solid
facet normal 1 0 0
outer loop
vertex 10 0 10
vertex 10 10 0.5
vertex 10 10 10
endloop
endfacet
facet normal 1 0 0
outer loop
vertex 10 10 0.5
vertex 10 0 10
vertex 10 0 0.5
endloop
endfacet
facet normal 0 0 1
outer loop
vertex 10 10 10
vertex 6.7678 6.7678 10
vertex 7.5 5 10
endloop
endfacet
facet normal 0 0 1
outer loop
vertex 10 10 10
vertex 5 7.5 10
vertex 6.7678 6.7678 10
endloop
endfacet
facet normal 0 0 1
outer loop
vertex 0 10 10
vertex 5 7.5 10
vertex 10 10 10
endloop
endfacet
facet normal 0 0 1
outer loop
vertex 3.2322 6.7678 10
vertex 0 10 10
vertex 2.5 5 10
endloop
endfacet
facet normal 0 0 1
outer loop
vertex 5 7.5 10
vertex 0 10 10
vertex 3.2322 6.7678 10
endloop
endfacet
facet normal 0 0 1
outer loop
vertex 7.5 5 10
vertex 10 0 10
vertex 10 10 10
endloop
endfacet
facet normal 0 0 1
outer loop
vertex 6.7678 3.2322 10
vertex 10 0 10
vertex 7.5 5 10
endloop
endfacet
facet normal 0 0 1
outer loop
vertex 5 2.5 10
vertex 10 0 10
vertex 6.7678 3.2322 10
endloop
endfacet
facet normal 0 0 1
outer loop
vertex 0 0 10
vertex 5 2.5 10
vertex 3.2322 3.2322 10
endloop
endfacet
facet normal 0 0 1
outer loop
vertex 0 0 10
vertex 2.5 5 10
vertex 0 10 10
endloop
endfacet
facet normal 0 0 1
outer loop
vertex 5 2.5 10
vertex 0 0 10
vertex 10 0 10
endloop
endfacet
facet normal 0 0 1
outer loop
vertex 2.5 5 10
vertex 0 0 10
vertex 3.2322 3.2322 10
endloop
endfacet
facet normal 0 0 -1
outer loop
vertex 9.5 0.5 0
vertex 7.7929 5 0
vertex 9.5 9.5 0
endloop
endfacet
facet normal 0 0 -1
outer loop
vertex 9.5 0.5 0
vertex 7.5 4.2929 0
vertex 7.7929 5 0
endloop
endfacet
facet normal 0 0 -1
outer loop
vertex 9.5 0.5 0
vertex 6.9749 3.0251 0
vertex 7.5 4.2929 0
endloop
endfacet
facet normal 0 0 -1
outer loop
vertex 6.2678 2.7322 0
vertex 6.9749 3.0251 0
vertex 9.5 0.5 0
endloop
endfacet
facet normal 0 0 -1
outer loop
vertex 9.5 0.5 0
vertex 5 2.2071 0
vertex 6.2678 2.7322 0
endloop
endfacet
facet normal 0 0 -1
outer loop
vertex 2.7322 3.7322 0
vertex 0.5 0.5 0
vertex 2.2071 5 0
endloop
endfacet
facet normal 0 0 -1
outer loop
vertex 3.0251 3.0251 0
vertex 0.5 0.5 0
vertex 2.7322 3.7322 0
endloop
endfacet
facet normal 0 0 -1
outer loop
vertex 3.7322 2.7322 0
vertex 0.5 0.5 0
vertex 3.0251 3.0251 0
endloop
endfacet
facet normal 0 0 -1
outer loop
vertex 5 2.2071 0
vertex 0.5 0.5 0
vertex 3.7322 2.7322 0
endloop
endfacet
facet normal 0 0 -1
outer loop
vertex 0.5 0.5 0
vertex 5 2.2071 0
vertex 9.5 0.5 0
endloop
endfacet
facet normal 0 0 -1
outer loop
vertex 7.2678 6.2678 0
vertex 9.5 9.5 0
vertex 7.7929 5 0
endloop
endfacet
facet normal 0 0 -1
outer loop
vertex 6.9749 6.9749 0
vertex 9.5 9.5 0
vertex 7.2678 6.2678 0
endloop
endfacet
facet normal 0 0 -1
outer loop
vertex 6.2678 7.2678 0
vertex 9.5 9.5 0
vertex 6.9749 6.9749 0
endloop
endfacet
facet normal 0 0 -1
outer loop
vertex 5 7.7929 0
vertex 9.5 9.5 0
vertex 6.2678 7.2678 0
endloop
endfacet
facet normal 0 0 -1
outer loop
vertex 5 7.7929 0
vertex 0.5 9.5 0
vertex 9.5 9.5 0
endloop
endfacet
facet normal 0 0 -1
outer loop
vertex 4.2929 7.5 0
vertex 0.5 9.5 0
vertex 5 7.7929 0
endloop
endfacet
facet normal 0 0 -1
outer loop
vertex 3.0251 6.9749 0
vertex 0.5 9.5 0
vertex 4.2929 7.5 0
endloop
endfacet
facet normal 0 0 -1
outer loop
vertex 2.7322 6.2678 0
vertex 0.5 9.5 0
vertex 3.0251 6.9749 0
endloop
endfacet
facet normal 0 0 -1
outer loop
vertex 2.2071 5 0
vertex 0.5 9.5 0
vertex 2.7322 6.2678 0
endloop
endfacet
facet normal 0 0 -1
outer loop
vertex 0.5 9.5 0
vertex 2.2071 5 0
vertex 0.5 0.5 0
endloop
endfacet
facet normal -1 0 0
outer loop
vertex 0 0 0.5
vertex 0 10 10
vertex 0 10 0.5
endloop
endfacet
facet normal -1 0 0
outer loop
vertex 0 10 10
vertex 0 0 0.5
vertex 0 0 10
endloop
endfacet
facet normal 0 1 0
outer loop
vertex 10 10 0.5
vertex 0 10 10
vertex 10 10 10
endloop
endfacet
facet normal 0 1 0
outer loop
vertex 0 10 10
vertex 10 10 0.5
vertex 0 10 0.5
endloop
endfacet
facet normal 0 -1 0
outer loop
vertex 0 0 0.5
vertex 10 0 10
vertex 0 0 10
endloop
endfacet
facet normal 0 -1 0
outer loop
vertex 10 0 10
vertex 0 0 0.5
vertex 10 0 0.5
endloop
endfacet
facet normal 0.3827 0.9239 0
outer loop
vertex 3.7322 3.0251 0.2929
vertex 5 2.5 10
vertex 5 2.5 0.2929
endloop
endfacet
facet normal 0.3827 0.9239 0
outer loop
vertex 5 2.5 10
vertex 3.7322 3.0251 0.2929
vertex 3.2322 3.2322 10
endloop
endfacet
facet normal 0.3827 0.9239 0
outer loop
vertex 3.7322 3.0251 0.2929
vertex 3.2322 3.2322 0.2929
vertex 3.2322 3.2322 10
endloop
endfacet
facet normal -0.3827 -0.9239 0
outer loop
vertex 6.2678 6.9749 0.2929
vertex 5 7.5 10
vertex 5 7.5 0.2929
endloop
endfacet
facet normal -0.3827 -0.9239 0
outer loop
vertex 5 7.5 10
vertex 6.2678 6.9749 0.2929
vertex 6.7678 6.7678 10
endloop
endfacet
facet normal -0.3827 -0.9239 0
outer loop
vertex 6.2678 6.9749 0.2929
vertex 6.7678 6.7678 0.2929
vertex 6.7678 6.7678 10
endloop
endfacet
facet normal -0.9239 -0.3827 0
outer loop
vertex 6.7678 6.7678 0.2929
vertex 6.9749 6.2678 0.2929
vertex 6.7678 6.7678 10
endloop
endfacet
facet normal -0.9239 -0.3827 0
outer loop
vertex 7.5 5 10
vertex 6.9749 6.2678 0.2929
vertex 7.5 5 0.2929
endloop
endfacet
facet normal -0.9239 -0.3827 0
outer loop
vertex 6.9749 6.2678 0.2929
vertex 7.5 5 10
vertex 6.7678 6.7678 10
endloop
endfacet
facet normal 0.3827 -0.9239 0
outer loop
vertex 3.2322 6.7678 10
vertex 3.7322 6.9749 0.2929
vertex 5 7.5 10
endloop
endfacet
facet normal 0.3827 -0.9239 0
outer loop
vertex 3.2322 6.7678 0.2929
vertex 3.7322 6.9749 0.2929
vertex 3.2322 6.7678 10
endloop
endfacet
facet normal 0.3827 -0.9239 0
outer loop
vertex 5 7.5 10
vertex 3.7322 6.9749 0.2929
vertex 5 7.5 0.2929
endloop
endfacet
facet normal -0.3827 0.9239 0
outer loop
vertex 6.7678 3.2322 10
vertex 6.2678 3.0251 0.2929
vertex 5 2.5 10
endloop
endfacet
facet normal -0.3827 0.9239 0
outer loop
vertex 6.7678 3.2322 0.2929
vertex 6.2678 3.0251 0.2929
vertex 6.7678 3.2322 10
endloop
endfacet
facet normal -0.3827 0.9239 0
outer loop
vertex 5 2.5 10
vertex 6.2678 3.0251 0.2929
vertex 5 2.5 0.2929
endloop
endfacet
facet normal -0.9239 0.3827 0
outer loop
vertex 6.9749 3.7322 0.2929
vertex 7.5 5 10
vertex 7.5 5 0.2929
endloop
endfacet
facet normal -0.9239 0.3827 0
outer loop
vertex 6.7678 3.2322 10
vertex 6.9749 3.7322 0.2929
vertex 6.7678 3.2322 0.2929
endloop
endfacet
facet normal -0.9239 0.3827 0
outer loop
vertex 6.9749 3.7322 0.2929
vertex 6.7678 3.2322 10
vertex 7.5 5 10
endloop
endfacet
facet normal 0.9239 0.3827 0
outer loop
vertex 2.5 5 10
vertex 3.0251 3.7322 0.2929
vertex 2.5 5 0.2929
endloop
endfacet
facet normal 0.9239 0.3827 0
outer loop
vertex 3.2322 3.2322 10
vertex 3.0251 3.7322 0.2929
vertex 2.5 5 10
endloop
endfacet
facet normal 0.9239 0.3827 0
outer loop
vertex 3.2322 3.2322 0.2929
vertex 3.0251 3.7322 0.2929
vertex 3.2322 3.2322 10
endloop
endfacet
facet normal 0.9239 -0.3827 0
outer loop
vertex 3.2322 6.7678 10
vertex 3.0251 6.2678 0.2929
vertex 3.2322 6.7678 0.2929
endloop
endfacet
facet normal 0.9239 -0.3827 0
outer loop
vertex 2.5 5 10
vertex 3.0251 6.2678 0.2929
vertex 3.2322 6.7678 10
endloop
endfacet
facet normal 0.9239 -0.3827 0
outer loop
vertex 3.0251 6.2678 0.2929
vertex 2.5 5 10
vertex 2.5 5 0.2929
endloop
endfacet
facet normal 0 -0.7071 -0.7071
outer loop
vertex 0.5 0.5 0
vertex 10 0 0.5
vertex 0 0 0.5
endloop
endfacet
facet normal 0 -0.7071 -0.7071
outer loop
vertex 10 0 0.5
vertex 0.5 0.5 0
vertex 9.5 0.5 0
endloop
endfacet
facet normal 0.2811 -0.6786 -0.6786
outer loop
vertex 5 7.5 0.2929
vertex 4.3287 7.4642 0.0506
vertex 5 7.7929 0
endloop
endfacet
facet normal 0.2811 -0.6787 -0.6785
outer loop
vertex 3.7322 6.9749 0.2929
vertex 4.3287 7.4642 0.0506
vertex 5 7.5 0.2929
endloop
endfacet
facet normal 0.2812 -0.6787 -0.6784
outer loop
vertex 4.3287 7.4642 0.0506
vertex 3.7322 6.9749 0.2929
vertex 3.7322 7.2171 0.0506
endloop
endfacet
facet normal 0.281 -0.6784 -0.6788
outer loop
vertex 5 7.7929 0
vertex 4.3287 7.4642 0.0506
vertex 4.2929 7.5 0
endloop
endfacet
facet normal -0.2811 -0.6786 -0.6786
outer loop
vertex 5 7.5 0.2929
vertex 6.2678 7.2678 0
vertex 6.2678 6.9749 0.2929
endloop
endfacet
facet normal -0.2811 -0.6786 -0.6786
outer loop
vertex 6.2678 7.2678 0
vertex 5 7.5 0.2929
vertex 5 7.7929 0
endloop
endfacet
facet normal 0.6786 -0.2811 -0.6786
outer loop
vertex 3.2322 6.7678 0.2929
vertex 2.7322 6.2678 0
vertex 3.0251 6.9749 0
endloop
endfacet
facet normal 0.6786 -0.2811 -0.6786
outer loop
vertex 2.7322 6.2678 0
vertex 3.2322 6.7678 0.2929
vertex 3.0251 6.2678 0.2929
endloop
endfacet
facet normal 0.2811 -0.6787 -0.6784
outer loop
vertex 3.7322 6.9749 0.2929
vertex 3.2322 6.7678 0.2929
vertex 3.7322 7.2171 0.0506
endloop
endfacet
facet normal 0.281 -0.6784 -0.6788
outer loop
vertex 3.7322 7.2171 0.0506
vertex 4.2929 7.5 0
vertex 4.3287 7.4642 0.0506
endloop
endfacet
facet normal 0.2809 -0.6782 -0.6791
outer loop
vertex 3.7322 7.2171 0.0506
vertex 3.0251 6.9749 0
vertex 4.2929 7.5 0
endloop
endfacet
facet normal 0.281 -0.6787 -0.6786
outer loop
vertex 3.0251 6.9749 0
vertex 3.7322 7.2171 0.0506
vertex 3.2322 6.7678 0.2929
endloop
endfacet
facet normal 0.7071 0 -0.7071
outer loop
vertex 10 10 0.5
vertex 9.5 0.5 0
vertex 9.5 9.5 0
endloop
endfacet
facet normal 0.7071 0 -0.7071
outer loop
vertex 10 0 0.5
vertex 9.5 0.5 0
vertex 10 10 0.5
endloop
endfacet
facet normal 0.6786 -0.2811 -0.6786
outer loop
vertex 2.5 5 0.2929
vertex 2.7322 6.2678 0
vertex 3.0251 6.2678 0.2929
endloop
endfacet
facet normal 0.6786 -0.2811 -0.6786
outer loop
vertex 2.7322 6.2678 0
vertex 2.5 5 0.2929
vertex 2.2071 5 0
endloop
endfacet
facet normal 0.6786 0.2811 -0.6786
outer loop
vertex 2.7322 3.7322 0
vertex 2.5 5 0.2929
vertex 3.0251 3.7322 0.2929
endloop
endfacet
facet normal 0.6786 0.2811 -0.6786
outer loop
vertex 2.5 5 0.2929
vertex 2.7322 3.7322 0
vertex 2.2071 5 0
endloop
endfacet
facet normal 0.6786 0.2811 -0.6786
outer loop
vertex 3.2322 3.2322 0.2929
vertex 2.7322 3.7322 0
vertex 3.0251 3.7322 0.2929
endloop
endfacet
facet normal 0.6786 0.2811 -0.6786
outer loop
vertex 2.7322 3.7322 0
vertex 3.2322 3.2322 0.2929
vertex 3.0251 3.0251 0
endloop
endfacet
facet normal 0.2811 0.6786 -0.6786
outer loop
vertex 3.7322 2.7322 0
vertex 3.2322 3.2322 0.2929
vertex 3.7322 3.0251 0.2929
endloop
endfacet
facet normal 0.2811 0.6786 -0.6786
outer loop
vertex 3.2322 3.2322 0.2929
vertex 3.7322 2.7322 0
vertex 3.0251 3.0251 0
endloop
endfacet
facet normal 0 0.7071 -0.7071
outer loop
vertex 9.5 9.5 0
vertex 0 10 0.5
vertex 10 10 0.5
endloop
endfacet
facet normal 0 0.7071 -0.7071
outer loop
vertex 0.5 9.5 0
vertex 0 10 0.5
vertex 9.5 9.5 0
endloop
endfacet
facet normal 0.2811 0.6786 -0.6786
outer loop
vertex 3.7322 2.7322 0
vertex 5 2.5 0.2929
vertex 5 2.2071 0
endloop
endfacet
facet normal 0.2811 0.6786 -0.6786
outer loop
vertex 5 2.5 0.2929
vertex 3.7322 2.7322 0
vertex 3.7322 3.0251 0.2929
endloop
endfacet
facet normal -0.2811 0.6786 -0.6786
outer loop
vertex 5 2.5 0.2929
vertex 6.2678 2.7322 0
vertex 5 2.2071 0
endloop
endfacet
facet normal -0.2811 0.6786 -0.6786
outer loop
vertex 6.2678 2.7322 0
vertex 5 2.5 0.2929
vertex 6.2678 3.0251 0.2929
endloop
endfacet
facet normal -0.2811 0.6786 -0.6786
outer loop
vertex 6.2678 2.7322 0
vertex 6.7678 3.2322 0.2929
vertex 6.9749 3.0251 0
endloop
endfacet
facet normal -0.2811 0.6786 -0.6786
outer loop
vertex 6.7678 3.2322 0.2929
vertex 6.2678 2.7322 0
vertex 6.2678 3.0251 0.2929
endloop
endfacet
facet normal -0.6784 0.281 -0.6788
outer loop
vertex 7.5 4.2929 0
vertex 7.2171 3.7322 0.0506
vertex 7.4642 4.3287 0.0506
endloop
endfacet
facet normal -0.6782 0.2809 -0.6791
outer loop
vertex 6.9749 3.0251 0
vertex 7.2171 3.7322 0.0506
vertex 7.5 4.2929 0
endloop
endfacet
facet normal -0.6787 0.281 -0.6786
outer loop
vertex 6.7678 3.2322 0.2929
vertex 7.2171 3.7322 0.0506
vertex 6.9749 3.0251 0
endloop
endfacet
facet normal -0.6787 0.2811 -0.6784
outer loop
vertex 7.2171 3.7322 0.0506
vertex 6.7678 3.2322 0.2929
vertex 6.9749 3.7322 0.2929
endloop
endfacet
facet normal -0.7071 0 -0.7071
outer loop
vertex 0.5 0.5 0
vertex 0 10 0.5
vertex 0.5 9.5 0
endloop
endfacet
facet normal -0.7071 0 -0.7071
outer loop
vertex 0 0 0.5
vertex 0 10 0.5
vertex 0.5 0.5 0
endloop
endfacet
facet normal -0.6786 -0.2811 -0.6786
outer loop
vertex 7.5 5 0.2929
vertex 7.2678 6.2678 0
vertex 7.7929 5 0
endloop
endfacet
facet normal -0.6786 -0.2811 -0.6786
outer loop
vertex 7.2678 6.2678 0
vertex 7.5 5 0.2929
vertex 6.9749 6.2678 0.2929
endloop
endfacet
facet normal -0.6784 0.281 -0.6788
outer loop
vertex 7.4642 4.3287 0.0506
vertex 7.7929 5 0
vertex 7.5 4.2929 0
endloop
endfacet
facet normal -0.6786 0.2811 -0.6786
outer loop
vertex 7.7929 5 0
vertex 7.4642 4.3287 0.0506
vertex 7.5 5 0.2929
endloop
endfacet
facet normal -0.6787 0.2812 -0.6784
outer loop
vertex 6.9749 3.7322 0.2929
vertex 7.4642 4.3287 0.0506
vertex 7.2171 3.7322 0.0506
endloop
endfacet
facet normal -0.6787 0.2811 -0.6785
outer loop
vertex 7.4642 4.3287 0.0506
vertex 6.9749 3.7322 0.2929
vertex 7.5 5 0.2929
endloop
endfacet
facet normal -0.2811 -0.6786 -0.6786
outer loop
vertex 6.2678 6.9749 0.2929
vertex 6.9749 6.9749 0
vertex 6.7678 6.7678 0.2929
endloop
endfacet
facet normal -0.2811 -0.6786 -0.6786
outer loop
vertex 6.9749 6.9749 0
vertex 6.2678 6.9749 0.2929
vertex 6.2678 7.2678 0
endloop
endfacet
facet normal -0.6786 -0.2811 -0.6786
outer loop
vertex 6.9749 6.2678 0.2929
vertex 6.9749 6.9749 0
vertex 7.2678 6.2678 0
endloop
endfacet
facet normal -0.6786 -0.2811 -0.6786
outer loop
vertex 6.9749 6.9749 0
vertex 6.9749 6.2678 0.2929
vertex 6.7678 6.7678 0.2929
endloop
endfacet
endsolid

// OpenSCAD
// Using Minkowski sums for beveled bottom edges.

render_part=1; //bevel_mask()
render_part=2; // test_bevel_minkowski() on cube
render_part=3; // test_bevel_minkowski() on cylinder
render_part=4; // test_bevel_minkowski() on holes

module bevel_mask(extension=0.1,bevel_w=1.0) {
  render() translate([0,bevel_w,0]) difference() {
    translate([0,0,bevel_w]) cube(size=[2*bevel_w,2*bevel_w,2*bevel_w],center=true);
    translate([-bevel_w-extension,-bevel_w,bevel_w]) rotate([-45-90,0,0])
	cube(size=[2*bevel_w+2*extension,2*bevel_w,2*bevel_w],center=false);
  }
}

if(render_part==1) {
  echo("Rendering bevel_mask()...");
  bevel_mask();
}

module test_bevel_minkowski(bevel_w=0.5,resolution=8) {
  for(i=[0:$children-1])
   intersection_for(j=[0:resolution-1]) {
    child(i);
    render() minkowski() {
        child(i);
        rotate([0,0,360*j/resolution]) bevel_mask(bevel_w=bevel_w);
    }
  }
}

if(render_part==2) {
  echo("Rendering test_bevel_minkowski() on cube");
  test_bevel_minkowski(bevel_w=0.5) {
    cube(size=[10,10,10]);
  }
  translate([10,10,0]) cube(size=[10,10,10]);
  cube(size=[0.5,0.5,0.5],center=false);
}

if(render_part==3) {
  echo("Rendering test_bevel_minkowski() on cylinder");
  test_bevel_minkowski(bevel_w=0.5) {
    cylinder(r=5,h=10,center=false);
  }
  translate([0,0,-5]) cube(size=[10,10,10],center=true);
  cube(size=[0.5,0.5,0.5],center=false);
}

if(render_part==4) {
  echo("Rendering test_bevel_minkowski() on part with holes");
  test_bevel_minkowski(bevel_w=0.5) {
    render() difference() {
	cube(size=[10,10,10], center=false);
	translate([5,5,-0.1]) cylinder(r=2.5,h=10+2*0.1,center=false);
    }
  }
}
